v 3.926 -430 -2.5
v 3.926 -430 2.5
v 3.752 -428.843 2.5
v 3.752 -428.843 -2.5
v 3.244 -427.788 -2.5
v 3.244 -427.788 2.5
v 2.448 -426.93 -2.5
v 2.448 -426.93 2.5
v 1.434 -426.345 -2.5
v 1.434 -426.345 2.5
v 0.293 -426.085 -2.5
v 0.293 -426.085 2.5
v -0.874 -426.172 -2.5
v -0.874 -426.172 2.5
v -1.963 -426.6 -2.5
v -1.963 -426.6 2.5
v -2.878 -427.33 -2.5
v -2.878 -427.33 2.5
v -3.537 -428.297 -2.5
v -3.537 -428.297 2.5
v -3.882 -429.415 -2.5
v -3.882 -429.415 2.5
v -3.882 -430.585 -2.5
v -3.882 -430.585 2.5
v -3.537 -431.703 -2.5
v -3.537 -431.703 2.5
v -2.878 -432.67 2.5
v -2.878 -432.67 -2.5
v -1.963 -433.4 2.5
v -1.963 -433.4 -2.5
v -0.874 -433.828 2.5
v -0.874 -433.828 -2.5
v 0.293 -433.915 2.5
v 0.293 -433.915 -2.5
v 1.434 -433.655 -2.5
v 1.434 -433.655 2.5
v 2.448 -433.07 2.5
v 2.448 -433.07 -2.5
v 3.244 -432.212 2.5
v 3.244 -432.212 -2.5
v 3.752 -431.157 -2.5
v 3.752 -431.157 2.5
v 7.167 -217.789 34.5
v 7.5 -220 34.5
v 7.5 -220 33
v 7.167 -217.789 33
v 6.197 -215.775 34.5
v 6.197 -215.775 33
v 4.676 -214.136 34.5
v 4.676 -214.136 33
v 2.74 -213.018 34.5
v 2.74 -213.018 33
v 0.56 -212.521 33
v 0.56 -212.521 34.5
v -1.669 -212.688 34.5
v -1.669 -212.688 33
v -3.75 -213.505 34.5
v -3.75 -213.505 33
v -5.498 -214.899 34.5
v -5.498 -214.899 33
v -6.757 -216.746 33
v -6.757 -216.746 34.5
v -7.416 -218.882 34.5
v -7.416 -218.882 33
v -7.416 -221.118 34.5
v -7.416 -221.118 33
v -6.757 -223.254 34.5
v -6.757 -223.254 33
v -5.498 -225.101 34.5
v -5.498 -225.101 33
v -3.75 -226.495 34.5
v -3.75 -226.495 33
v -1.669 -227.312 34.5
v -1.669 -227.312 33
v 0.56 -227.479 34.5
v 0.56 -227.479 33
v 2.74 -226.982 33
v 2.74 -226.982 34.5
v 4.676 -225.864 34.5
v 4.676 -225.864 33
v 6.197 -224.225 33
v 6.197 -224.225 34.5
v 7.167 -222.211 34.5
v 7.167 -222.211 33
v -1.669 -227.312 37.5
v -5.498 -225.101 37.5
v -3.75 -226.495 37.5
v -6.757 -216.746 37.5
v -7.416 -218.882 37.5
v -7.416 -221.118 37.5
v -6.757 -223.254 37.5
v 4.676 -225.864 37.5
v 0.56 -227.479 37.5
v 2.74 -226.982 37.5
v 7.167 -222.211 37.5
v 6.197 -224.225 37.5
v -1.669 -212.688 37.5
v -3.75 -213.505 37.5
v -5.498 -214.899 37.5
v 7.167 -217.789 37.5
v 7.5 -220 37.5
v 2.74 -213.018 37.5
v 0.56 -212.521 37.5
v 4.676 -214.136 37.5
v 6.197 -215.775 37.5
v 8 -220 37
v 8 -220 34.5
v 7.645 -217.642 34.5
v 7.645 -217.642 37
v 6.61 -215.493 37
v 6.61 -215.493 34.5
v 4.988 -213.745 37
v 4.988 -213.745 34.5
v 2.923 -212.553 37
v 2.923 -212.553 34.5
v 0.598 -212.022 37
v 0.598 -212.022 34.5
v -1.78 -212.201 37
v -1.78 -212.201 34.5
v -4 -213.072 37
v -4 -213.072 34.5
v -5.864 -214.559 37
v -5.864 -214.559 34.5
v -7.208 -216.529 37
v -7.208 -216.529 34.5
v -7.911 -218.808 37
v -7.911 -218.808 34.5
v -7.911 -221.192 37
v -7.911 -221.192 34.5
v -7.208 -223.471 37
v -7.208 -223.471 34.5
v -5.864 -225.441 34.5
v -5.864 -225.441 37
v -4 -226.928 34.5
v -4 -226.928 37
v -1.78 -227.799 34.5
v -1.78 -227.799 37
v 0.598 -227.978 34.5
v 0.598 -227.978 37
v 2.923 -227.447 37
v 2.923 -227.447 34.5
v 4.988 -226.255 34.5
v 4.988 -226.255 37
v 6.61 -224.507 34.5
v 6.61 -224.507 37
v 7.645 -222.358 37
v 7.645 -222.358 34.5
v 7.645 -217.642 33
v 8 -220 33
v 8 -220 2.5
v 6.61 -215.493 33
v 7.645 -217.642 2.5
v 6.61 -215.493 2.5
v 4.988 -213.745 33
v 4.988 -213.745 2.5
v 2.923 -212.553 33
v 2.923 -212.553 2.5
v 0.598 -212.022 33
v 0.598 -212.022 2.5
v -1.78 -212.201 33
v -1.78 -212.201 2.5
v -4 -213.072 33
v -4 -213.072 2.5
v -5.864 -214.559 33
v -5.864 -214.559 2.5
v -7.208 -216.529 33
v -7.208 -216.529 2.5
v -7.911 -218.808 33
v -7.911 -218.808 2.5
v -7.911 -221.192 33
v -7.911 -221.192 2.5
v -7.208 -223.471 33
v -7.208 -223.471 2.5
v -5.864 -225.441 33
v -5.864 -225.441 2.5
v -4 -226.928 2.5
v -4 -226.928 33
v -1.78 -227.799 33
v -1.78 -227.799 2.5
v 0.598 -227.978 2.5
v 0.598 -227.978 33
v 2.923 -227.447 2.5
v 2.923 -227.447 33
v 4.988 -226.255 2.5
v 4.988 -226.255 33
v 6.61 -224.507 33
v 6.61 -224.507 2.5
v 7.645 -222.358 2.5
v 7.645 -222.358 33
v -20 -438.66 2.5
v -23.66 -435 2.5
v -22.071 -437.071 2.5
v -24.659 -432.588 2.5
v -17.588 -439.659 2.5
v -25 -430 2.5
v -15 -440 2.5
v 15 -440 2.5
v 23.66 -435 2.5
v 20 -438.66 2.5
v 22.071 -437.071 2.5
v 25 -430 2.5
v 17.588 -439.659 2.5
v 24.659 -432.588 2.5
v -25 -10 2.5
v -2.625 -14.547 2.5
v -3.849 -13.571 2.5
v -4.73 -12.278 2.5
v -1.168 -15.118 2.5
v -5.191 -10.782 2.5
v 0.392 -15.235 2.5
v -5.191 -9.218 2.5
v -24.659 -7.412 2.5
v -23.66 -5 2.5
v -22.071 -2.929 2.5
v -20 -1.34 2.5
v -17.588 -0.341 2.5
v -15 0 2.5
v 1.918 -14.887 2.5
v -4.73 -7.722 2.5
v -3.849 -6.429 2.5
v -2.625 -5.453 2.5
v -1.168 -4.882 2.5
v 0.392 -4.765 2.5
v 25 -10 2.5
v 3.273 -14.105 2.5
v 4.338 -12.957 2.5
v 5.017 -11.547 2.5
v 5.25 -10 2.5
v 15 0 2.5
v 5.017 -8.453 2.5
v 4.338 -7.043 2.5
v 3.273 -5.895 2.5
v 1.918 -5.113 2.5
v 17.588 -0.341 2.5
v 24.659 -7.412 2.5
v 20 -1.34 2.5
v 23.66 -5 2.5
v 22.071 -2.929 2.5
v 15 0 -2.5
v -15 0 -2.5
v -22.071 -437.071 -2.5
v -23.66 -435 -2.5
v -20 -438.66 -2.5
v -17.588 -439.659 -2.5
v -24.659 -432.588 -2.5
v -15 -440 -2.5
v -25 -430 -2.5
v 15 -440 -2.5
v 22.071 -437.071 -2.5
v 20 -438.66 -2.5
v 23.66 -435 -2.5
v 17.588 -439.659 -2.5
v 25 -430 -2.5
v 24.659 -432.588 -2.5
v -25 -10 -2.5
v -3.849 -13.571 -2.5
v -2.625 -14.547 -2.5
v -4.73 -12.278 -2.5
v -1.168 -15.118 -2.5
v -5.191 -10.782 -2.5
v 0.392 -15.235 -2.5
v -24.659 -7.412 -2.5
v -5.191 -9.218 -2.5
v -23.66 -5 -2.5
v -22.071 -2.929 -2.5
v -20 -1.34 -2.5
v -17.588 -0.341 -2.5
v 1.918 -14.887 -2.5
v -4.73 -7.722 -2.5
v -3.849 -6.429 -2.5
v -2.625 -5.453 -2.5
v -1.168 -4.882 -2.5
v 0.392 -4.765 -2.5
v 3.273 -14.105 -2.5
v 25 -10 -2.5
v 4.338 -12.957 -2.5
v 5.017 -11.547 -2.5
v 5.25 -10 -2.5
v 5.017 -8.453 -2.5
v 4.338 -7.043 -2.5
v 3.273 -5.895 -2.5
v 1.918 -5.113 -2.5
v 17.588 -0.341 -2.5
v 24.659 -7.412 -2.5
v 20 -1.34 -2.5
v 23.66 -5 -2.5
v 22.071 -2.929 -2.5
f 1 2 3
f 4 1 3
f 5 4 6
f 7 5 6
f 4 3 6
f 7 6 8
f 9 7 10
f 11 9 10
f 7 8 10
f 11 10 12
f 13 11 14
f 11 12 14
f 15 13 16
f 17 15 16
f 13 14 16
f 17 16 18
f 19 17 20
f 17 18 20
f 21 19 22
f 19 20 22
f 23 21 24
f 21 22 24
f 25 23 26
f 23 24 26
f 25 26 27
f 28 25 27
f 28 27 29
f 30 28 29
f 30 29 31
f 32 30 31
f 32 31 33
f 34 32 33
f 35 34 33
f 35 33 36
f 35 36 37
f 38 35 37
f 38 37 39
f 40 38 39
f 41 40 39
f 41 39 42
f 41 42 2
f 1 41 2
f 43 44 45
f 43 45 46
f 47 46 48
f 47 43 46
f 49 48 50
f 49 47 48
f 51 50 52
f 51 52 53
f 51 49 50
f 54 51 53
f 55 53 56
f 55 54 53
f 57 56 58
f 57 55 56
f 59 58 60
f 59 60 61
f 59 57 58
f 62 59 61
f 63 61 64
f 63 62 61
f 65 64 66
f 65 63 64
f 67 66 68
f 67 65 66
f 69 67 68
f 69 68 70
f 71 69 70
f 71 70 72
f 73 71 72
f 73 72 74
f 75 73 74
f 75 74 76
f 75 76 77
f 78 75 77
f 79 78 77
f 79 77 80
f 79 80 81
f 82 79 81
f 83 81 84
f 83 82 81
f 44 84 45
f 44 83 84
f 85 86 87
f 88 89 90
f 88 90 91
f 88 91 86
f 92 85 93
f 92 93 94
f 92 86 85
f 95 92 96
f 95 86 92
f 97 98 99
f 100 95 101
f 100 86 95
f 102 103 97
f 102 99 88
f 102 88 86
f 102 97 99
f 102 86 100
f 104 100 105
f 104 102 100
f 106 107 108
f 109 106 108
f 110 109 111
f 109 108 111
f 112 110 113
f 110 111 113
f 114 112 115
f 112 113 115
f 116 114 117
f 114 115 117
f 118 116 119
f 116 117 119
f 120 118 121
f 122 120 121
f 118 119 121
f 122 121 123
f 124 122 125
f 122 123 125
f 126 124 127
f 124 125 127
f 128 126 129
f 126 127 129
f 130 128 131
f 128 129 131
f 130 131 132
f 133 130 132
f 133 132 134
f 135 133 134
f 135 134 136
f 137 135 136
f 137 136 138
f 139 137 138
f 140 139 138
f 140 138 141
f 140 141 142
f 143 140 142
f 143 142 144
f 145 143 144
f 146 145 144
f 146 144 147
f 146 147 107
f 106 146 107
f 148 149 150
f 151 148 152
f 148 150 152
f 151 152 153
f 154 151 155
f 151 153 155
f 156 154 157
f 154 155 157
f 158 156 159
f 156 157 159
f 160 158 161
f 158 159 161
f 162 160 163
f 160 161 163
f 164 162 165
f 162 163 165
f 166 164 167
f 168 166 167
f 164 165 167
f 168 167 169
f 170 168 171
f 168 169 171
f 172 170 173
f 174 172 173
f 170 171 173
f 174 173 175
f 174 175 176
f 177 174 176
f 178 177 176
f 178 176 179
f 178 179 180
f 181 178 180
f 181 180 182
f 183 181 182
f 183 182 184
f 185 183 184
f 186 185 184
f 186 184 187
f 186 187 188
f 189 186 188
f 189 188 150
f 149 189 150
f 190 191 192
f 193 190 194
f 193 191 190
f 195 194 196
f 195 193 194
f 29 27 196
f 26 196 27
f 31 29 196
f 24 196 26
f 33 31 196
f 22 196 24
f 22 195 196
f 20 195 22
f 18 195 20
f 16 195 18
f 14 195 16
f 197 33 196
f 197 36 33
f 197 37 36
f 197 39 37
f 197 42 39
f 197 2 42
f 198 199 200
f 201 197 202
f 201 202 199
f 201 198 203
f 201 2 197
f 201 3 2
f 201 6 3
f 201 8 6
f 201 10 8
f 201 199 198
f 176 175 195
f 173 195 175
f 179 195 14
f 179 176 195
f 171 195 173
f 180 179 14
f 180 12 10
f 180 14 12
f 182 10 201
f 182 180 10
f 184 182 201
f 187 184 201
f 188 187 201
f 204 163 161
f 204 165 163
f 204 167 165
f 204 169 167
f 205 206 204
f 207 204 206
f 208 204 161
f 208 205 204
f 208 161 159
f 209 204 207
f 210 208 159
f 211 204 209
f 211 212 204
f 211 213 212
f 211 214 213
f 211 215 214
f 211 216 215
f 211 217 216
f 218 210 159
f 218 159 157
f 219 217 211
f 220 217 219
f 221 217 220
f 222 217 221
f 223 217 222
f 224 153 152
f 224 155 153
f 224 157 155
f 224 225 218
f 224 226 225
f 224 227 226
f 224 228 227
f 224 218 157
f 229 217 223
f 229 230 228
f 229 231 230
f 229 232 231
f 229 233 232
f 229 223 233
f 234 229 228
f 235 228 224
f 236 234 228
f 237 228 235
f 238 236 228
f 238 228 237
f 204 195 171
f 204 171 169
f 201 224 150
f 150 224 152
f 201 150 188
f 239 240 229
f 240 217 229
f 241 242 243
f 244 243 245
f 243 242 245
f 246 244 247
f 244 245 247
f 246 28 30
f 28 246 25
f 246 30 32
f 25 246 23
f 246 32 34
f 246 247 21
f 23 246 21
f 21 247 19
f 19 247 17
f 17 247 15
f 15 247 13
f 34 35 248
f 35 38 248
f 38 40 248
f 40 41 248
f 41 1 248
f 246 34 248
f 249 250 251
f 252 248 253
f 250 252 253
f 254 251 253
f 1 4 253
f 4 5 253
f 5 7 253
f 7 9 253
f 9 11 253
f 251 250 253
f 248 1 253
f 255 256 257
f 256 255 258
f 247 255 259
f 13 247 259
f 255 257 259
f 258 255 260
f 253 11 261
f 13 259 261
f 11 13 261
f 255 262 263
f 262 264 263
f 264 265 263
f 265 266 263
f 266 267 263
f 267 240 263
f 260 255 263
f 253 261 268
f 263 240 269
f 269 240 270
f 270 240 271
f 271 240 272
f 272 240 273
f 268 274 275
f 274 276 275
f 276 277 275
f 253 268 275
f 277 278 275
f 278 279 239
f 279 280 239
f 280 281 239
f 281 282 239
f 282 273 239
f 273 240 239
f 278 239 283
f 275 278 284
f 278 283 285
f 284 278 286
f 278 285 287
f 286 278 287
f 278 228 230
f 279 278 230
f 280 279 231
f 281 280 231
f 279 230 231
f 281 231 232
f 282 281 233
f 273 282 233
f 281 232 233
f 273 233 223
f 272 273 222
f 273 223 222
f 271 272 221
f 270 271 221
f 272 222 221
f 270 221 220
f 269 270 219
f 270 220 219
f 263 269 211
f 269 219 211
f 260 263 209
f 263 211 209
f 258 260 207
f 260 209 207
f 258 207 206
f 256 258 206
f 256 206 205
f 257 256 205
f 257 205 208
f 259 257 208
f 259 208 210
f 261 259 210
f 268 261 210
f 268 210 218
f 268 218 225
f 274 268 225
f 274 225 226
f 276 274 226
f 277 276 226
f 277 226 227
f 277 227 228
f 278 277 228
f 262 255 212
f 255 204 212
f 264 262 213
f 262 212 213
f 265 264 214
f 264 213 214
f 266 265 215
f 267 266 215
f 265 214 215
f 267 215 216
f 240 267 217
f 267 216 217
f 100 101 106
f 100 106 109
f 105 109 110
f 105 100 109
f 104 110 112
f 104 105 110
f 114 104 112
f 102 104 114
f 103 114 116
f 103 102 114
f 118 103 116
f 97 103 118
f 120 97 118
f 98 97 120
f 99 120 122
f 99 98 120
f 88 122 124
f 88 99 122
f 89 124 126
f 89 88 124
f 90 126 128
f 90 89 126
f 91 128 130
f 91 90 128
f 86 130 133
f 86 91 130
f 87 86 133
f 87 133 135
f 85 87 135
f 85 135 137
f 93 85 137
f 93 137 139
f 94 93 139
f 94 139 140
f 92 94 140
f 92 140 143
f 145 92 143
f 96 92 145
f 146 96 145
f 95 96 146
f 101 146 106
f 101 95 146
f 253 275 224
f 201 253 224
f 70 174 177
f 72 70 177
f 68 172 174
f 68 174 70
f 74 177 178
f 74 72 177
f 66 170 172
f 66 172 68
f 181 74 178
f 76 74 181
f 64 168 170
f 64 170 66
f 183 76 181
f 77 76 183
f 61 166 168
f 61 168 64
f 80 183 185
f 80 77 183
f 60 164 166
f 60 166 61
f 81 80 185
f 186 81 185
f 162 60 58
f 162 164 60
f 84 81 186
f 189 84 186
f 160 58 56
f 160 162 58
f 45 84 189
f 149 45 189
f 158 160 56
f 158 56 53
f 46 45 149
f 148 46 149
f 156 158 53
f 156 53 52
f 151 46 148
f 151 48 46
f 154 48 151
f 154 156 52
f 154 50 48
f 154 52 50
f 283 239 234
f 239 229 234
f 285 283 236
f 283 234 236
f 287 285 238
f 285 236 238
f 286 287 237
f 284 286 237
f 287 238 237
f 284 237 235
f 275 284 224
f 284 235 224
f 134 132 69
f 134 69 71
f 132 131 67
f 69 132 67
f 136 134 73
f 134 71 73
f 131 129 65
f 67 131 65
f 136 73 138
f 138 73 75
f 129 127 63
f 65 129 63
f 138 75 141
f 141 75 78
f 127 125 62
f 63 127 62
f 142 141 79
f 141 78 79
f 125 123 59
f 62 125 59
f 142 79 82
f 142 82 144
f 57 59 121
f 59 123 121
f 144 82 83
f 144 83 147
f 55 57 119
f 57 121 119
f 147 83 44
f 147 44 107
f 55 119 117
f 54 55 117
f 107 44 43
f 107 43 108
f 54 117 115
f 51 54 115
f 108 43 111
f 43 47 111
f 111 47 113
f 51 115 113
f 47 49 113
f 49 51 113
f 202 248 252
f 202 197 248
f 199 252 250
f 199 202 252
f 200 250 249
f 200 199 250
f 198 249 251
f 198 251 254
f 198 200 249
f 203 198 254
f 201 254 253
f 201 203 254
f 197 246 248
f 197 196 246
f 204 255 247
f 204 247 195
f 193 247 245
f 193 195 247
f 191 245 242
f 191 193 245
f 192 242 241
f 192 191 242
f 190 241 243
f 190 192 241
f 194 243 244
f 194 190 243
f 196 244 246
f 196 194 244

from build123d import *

# Parameters (mm, degrees)
F0_W     = 50
F0_H     = 5
F1_DEPTH = 440
F2_R     = 5.25
F2_R_2   = 3.9261217041
F3_DEPTH = 5.001
F4_R     = 8
F5_DEPTH = 35
F6_R     = 10
F8_R     = 8
F8_R_2   = 7.5
F9_DEPTH = 1.5
F10_SIZE = 0.5


with BuildPart() as f1:
    # F0 (on Front) → F1 (new body)
    with BuildSketch(Plane.XZ):
        Rectangle(F0_W, F0_H)
    extrude(amount=F1_DEPTH)

    # F2 (on face) → F3 (cut, through all)
    with BuildSketch(Plane.XY.offset(2.5)):
        with Locations((0, -10)):
            Circle(F2_R)
        with Locations((0, -430)):
            Circle(F2_R_2)
    extrude(amount=-F3_DEPTH, mode=Mode.SUBTRACT)

    # F4 (on face) → F5 (join)
    with BuildSketch(Plane.XY.offset(2.5)):
        with Locations((0, -220)):
            Circle(F4_R)
    extrude(amount=F5_DEPTH)

    # F6
    f6_edges = [f1.edges().sort_by_distance(p)[0] for p in [
        (-25, -440, 0),
        (25, -440, 0),
        (25, 0, 0),
        (-25, 0, 0),
    ]]
    fillet(f6_edges, radius=F6_R)

    # F8 (on offset) → F9 (cut)
    with BuildSketch(Plane.XY.offset(34.5)):
        with Locations((0, -220)):
            Circle(F8_R)
        with Locations((0, -220)):
            Circle(F8_R_2, mode=Mode.SUBTRACT)
    extrude(amount=-F9_DEPTH, mode=Mode.SUBTRACT)

    # F10
    f10_edges = [f1.edges().sort_by_distance(p)[0] for p in [
        (-8, -220, 37.5),
    ]]
    chamfer(f10_edges, length=F10_SIZE)


solid = f1.part
